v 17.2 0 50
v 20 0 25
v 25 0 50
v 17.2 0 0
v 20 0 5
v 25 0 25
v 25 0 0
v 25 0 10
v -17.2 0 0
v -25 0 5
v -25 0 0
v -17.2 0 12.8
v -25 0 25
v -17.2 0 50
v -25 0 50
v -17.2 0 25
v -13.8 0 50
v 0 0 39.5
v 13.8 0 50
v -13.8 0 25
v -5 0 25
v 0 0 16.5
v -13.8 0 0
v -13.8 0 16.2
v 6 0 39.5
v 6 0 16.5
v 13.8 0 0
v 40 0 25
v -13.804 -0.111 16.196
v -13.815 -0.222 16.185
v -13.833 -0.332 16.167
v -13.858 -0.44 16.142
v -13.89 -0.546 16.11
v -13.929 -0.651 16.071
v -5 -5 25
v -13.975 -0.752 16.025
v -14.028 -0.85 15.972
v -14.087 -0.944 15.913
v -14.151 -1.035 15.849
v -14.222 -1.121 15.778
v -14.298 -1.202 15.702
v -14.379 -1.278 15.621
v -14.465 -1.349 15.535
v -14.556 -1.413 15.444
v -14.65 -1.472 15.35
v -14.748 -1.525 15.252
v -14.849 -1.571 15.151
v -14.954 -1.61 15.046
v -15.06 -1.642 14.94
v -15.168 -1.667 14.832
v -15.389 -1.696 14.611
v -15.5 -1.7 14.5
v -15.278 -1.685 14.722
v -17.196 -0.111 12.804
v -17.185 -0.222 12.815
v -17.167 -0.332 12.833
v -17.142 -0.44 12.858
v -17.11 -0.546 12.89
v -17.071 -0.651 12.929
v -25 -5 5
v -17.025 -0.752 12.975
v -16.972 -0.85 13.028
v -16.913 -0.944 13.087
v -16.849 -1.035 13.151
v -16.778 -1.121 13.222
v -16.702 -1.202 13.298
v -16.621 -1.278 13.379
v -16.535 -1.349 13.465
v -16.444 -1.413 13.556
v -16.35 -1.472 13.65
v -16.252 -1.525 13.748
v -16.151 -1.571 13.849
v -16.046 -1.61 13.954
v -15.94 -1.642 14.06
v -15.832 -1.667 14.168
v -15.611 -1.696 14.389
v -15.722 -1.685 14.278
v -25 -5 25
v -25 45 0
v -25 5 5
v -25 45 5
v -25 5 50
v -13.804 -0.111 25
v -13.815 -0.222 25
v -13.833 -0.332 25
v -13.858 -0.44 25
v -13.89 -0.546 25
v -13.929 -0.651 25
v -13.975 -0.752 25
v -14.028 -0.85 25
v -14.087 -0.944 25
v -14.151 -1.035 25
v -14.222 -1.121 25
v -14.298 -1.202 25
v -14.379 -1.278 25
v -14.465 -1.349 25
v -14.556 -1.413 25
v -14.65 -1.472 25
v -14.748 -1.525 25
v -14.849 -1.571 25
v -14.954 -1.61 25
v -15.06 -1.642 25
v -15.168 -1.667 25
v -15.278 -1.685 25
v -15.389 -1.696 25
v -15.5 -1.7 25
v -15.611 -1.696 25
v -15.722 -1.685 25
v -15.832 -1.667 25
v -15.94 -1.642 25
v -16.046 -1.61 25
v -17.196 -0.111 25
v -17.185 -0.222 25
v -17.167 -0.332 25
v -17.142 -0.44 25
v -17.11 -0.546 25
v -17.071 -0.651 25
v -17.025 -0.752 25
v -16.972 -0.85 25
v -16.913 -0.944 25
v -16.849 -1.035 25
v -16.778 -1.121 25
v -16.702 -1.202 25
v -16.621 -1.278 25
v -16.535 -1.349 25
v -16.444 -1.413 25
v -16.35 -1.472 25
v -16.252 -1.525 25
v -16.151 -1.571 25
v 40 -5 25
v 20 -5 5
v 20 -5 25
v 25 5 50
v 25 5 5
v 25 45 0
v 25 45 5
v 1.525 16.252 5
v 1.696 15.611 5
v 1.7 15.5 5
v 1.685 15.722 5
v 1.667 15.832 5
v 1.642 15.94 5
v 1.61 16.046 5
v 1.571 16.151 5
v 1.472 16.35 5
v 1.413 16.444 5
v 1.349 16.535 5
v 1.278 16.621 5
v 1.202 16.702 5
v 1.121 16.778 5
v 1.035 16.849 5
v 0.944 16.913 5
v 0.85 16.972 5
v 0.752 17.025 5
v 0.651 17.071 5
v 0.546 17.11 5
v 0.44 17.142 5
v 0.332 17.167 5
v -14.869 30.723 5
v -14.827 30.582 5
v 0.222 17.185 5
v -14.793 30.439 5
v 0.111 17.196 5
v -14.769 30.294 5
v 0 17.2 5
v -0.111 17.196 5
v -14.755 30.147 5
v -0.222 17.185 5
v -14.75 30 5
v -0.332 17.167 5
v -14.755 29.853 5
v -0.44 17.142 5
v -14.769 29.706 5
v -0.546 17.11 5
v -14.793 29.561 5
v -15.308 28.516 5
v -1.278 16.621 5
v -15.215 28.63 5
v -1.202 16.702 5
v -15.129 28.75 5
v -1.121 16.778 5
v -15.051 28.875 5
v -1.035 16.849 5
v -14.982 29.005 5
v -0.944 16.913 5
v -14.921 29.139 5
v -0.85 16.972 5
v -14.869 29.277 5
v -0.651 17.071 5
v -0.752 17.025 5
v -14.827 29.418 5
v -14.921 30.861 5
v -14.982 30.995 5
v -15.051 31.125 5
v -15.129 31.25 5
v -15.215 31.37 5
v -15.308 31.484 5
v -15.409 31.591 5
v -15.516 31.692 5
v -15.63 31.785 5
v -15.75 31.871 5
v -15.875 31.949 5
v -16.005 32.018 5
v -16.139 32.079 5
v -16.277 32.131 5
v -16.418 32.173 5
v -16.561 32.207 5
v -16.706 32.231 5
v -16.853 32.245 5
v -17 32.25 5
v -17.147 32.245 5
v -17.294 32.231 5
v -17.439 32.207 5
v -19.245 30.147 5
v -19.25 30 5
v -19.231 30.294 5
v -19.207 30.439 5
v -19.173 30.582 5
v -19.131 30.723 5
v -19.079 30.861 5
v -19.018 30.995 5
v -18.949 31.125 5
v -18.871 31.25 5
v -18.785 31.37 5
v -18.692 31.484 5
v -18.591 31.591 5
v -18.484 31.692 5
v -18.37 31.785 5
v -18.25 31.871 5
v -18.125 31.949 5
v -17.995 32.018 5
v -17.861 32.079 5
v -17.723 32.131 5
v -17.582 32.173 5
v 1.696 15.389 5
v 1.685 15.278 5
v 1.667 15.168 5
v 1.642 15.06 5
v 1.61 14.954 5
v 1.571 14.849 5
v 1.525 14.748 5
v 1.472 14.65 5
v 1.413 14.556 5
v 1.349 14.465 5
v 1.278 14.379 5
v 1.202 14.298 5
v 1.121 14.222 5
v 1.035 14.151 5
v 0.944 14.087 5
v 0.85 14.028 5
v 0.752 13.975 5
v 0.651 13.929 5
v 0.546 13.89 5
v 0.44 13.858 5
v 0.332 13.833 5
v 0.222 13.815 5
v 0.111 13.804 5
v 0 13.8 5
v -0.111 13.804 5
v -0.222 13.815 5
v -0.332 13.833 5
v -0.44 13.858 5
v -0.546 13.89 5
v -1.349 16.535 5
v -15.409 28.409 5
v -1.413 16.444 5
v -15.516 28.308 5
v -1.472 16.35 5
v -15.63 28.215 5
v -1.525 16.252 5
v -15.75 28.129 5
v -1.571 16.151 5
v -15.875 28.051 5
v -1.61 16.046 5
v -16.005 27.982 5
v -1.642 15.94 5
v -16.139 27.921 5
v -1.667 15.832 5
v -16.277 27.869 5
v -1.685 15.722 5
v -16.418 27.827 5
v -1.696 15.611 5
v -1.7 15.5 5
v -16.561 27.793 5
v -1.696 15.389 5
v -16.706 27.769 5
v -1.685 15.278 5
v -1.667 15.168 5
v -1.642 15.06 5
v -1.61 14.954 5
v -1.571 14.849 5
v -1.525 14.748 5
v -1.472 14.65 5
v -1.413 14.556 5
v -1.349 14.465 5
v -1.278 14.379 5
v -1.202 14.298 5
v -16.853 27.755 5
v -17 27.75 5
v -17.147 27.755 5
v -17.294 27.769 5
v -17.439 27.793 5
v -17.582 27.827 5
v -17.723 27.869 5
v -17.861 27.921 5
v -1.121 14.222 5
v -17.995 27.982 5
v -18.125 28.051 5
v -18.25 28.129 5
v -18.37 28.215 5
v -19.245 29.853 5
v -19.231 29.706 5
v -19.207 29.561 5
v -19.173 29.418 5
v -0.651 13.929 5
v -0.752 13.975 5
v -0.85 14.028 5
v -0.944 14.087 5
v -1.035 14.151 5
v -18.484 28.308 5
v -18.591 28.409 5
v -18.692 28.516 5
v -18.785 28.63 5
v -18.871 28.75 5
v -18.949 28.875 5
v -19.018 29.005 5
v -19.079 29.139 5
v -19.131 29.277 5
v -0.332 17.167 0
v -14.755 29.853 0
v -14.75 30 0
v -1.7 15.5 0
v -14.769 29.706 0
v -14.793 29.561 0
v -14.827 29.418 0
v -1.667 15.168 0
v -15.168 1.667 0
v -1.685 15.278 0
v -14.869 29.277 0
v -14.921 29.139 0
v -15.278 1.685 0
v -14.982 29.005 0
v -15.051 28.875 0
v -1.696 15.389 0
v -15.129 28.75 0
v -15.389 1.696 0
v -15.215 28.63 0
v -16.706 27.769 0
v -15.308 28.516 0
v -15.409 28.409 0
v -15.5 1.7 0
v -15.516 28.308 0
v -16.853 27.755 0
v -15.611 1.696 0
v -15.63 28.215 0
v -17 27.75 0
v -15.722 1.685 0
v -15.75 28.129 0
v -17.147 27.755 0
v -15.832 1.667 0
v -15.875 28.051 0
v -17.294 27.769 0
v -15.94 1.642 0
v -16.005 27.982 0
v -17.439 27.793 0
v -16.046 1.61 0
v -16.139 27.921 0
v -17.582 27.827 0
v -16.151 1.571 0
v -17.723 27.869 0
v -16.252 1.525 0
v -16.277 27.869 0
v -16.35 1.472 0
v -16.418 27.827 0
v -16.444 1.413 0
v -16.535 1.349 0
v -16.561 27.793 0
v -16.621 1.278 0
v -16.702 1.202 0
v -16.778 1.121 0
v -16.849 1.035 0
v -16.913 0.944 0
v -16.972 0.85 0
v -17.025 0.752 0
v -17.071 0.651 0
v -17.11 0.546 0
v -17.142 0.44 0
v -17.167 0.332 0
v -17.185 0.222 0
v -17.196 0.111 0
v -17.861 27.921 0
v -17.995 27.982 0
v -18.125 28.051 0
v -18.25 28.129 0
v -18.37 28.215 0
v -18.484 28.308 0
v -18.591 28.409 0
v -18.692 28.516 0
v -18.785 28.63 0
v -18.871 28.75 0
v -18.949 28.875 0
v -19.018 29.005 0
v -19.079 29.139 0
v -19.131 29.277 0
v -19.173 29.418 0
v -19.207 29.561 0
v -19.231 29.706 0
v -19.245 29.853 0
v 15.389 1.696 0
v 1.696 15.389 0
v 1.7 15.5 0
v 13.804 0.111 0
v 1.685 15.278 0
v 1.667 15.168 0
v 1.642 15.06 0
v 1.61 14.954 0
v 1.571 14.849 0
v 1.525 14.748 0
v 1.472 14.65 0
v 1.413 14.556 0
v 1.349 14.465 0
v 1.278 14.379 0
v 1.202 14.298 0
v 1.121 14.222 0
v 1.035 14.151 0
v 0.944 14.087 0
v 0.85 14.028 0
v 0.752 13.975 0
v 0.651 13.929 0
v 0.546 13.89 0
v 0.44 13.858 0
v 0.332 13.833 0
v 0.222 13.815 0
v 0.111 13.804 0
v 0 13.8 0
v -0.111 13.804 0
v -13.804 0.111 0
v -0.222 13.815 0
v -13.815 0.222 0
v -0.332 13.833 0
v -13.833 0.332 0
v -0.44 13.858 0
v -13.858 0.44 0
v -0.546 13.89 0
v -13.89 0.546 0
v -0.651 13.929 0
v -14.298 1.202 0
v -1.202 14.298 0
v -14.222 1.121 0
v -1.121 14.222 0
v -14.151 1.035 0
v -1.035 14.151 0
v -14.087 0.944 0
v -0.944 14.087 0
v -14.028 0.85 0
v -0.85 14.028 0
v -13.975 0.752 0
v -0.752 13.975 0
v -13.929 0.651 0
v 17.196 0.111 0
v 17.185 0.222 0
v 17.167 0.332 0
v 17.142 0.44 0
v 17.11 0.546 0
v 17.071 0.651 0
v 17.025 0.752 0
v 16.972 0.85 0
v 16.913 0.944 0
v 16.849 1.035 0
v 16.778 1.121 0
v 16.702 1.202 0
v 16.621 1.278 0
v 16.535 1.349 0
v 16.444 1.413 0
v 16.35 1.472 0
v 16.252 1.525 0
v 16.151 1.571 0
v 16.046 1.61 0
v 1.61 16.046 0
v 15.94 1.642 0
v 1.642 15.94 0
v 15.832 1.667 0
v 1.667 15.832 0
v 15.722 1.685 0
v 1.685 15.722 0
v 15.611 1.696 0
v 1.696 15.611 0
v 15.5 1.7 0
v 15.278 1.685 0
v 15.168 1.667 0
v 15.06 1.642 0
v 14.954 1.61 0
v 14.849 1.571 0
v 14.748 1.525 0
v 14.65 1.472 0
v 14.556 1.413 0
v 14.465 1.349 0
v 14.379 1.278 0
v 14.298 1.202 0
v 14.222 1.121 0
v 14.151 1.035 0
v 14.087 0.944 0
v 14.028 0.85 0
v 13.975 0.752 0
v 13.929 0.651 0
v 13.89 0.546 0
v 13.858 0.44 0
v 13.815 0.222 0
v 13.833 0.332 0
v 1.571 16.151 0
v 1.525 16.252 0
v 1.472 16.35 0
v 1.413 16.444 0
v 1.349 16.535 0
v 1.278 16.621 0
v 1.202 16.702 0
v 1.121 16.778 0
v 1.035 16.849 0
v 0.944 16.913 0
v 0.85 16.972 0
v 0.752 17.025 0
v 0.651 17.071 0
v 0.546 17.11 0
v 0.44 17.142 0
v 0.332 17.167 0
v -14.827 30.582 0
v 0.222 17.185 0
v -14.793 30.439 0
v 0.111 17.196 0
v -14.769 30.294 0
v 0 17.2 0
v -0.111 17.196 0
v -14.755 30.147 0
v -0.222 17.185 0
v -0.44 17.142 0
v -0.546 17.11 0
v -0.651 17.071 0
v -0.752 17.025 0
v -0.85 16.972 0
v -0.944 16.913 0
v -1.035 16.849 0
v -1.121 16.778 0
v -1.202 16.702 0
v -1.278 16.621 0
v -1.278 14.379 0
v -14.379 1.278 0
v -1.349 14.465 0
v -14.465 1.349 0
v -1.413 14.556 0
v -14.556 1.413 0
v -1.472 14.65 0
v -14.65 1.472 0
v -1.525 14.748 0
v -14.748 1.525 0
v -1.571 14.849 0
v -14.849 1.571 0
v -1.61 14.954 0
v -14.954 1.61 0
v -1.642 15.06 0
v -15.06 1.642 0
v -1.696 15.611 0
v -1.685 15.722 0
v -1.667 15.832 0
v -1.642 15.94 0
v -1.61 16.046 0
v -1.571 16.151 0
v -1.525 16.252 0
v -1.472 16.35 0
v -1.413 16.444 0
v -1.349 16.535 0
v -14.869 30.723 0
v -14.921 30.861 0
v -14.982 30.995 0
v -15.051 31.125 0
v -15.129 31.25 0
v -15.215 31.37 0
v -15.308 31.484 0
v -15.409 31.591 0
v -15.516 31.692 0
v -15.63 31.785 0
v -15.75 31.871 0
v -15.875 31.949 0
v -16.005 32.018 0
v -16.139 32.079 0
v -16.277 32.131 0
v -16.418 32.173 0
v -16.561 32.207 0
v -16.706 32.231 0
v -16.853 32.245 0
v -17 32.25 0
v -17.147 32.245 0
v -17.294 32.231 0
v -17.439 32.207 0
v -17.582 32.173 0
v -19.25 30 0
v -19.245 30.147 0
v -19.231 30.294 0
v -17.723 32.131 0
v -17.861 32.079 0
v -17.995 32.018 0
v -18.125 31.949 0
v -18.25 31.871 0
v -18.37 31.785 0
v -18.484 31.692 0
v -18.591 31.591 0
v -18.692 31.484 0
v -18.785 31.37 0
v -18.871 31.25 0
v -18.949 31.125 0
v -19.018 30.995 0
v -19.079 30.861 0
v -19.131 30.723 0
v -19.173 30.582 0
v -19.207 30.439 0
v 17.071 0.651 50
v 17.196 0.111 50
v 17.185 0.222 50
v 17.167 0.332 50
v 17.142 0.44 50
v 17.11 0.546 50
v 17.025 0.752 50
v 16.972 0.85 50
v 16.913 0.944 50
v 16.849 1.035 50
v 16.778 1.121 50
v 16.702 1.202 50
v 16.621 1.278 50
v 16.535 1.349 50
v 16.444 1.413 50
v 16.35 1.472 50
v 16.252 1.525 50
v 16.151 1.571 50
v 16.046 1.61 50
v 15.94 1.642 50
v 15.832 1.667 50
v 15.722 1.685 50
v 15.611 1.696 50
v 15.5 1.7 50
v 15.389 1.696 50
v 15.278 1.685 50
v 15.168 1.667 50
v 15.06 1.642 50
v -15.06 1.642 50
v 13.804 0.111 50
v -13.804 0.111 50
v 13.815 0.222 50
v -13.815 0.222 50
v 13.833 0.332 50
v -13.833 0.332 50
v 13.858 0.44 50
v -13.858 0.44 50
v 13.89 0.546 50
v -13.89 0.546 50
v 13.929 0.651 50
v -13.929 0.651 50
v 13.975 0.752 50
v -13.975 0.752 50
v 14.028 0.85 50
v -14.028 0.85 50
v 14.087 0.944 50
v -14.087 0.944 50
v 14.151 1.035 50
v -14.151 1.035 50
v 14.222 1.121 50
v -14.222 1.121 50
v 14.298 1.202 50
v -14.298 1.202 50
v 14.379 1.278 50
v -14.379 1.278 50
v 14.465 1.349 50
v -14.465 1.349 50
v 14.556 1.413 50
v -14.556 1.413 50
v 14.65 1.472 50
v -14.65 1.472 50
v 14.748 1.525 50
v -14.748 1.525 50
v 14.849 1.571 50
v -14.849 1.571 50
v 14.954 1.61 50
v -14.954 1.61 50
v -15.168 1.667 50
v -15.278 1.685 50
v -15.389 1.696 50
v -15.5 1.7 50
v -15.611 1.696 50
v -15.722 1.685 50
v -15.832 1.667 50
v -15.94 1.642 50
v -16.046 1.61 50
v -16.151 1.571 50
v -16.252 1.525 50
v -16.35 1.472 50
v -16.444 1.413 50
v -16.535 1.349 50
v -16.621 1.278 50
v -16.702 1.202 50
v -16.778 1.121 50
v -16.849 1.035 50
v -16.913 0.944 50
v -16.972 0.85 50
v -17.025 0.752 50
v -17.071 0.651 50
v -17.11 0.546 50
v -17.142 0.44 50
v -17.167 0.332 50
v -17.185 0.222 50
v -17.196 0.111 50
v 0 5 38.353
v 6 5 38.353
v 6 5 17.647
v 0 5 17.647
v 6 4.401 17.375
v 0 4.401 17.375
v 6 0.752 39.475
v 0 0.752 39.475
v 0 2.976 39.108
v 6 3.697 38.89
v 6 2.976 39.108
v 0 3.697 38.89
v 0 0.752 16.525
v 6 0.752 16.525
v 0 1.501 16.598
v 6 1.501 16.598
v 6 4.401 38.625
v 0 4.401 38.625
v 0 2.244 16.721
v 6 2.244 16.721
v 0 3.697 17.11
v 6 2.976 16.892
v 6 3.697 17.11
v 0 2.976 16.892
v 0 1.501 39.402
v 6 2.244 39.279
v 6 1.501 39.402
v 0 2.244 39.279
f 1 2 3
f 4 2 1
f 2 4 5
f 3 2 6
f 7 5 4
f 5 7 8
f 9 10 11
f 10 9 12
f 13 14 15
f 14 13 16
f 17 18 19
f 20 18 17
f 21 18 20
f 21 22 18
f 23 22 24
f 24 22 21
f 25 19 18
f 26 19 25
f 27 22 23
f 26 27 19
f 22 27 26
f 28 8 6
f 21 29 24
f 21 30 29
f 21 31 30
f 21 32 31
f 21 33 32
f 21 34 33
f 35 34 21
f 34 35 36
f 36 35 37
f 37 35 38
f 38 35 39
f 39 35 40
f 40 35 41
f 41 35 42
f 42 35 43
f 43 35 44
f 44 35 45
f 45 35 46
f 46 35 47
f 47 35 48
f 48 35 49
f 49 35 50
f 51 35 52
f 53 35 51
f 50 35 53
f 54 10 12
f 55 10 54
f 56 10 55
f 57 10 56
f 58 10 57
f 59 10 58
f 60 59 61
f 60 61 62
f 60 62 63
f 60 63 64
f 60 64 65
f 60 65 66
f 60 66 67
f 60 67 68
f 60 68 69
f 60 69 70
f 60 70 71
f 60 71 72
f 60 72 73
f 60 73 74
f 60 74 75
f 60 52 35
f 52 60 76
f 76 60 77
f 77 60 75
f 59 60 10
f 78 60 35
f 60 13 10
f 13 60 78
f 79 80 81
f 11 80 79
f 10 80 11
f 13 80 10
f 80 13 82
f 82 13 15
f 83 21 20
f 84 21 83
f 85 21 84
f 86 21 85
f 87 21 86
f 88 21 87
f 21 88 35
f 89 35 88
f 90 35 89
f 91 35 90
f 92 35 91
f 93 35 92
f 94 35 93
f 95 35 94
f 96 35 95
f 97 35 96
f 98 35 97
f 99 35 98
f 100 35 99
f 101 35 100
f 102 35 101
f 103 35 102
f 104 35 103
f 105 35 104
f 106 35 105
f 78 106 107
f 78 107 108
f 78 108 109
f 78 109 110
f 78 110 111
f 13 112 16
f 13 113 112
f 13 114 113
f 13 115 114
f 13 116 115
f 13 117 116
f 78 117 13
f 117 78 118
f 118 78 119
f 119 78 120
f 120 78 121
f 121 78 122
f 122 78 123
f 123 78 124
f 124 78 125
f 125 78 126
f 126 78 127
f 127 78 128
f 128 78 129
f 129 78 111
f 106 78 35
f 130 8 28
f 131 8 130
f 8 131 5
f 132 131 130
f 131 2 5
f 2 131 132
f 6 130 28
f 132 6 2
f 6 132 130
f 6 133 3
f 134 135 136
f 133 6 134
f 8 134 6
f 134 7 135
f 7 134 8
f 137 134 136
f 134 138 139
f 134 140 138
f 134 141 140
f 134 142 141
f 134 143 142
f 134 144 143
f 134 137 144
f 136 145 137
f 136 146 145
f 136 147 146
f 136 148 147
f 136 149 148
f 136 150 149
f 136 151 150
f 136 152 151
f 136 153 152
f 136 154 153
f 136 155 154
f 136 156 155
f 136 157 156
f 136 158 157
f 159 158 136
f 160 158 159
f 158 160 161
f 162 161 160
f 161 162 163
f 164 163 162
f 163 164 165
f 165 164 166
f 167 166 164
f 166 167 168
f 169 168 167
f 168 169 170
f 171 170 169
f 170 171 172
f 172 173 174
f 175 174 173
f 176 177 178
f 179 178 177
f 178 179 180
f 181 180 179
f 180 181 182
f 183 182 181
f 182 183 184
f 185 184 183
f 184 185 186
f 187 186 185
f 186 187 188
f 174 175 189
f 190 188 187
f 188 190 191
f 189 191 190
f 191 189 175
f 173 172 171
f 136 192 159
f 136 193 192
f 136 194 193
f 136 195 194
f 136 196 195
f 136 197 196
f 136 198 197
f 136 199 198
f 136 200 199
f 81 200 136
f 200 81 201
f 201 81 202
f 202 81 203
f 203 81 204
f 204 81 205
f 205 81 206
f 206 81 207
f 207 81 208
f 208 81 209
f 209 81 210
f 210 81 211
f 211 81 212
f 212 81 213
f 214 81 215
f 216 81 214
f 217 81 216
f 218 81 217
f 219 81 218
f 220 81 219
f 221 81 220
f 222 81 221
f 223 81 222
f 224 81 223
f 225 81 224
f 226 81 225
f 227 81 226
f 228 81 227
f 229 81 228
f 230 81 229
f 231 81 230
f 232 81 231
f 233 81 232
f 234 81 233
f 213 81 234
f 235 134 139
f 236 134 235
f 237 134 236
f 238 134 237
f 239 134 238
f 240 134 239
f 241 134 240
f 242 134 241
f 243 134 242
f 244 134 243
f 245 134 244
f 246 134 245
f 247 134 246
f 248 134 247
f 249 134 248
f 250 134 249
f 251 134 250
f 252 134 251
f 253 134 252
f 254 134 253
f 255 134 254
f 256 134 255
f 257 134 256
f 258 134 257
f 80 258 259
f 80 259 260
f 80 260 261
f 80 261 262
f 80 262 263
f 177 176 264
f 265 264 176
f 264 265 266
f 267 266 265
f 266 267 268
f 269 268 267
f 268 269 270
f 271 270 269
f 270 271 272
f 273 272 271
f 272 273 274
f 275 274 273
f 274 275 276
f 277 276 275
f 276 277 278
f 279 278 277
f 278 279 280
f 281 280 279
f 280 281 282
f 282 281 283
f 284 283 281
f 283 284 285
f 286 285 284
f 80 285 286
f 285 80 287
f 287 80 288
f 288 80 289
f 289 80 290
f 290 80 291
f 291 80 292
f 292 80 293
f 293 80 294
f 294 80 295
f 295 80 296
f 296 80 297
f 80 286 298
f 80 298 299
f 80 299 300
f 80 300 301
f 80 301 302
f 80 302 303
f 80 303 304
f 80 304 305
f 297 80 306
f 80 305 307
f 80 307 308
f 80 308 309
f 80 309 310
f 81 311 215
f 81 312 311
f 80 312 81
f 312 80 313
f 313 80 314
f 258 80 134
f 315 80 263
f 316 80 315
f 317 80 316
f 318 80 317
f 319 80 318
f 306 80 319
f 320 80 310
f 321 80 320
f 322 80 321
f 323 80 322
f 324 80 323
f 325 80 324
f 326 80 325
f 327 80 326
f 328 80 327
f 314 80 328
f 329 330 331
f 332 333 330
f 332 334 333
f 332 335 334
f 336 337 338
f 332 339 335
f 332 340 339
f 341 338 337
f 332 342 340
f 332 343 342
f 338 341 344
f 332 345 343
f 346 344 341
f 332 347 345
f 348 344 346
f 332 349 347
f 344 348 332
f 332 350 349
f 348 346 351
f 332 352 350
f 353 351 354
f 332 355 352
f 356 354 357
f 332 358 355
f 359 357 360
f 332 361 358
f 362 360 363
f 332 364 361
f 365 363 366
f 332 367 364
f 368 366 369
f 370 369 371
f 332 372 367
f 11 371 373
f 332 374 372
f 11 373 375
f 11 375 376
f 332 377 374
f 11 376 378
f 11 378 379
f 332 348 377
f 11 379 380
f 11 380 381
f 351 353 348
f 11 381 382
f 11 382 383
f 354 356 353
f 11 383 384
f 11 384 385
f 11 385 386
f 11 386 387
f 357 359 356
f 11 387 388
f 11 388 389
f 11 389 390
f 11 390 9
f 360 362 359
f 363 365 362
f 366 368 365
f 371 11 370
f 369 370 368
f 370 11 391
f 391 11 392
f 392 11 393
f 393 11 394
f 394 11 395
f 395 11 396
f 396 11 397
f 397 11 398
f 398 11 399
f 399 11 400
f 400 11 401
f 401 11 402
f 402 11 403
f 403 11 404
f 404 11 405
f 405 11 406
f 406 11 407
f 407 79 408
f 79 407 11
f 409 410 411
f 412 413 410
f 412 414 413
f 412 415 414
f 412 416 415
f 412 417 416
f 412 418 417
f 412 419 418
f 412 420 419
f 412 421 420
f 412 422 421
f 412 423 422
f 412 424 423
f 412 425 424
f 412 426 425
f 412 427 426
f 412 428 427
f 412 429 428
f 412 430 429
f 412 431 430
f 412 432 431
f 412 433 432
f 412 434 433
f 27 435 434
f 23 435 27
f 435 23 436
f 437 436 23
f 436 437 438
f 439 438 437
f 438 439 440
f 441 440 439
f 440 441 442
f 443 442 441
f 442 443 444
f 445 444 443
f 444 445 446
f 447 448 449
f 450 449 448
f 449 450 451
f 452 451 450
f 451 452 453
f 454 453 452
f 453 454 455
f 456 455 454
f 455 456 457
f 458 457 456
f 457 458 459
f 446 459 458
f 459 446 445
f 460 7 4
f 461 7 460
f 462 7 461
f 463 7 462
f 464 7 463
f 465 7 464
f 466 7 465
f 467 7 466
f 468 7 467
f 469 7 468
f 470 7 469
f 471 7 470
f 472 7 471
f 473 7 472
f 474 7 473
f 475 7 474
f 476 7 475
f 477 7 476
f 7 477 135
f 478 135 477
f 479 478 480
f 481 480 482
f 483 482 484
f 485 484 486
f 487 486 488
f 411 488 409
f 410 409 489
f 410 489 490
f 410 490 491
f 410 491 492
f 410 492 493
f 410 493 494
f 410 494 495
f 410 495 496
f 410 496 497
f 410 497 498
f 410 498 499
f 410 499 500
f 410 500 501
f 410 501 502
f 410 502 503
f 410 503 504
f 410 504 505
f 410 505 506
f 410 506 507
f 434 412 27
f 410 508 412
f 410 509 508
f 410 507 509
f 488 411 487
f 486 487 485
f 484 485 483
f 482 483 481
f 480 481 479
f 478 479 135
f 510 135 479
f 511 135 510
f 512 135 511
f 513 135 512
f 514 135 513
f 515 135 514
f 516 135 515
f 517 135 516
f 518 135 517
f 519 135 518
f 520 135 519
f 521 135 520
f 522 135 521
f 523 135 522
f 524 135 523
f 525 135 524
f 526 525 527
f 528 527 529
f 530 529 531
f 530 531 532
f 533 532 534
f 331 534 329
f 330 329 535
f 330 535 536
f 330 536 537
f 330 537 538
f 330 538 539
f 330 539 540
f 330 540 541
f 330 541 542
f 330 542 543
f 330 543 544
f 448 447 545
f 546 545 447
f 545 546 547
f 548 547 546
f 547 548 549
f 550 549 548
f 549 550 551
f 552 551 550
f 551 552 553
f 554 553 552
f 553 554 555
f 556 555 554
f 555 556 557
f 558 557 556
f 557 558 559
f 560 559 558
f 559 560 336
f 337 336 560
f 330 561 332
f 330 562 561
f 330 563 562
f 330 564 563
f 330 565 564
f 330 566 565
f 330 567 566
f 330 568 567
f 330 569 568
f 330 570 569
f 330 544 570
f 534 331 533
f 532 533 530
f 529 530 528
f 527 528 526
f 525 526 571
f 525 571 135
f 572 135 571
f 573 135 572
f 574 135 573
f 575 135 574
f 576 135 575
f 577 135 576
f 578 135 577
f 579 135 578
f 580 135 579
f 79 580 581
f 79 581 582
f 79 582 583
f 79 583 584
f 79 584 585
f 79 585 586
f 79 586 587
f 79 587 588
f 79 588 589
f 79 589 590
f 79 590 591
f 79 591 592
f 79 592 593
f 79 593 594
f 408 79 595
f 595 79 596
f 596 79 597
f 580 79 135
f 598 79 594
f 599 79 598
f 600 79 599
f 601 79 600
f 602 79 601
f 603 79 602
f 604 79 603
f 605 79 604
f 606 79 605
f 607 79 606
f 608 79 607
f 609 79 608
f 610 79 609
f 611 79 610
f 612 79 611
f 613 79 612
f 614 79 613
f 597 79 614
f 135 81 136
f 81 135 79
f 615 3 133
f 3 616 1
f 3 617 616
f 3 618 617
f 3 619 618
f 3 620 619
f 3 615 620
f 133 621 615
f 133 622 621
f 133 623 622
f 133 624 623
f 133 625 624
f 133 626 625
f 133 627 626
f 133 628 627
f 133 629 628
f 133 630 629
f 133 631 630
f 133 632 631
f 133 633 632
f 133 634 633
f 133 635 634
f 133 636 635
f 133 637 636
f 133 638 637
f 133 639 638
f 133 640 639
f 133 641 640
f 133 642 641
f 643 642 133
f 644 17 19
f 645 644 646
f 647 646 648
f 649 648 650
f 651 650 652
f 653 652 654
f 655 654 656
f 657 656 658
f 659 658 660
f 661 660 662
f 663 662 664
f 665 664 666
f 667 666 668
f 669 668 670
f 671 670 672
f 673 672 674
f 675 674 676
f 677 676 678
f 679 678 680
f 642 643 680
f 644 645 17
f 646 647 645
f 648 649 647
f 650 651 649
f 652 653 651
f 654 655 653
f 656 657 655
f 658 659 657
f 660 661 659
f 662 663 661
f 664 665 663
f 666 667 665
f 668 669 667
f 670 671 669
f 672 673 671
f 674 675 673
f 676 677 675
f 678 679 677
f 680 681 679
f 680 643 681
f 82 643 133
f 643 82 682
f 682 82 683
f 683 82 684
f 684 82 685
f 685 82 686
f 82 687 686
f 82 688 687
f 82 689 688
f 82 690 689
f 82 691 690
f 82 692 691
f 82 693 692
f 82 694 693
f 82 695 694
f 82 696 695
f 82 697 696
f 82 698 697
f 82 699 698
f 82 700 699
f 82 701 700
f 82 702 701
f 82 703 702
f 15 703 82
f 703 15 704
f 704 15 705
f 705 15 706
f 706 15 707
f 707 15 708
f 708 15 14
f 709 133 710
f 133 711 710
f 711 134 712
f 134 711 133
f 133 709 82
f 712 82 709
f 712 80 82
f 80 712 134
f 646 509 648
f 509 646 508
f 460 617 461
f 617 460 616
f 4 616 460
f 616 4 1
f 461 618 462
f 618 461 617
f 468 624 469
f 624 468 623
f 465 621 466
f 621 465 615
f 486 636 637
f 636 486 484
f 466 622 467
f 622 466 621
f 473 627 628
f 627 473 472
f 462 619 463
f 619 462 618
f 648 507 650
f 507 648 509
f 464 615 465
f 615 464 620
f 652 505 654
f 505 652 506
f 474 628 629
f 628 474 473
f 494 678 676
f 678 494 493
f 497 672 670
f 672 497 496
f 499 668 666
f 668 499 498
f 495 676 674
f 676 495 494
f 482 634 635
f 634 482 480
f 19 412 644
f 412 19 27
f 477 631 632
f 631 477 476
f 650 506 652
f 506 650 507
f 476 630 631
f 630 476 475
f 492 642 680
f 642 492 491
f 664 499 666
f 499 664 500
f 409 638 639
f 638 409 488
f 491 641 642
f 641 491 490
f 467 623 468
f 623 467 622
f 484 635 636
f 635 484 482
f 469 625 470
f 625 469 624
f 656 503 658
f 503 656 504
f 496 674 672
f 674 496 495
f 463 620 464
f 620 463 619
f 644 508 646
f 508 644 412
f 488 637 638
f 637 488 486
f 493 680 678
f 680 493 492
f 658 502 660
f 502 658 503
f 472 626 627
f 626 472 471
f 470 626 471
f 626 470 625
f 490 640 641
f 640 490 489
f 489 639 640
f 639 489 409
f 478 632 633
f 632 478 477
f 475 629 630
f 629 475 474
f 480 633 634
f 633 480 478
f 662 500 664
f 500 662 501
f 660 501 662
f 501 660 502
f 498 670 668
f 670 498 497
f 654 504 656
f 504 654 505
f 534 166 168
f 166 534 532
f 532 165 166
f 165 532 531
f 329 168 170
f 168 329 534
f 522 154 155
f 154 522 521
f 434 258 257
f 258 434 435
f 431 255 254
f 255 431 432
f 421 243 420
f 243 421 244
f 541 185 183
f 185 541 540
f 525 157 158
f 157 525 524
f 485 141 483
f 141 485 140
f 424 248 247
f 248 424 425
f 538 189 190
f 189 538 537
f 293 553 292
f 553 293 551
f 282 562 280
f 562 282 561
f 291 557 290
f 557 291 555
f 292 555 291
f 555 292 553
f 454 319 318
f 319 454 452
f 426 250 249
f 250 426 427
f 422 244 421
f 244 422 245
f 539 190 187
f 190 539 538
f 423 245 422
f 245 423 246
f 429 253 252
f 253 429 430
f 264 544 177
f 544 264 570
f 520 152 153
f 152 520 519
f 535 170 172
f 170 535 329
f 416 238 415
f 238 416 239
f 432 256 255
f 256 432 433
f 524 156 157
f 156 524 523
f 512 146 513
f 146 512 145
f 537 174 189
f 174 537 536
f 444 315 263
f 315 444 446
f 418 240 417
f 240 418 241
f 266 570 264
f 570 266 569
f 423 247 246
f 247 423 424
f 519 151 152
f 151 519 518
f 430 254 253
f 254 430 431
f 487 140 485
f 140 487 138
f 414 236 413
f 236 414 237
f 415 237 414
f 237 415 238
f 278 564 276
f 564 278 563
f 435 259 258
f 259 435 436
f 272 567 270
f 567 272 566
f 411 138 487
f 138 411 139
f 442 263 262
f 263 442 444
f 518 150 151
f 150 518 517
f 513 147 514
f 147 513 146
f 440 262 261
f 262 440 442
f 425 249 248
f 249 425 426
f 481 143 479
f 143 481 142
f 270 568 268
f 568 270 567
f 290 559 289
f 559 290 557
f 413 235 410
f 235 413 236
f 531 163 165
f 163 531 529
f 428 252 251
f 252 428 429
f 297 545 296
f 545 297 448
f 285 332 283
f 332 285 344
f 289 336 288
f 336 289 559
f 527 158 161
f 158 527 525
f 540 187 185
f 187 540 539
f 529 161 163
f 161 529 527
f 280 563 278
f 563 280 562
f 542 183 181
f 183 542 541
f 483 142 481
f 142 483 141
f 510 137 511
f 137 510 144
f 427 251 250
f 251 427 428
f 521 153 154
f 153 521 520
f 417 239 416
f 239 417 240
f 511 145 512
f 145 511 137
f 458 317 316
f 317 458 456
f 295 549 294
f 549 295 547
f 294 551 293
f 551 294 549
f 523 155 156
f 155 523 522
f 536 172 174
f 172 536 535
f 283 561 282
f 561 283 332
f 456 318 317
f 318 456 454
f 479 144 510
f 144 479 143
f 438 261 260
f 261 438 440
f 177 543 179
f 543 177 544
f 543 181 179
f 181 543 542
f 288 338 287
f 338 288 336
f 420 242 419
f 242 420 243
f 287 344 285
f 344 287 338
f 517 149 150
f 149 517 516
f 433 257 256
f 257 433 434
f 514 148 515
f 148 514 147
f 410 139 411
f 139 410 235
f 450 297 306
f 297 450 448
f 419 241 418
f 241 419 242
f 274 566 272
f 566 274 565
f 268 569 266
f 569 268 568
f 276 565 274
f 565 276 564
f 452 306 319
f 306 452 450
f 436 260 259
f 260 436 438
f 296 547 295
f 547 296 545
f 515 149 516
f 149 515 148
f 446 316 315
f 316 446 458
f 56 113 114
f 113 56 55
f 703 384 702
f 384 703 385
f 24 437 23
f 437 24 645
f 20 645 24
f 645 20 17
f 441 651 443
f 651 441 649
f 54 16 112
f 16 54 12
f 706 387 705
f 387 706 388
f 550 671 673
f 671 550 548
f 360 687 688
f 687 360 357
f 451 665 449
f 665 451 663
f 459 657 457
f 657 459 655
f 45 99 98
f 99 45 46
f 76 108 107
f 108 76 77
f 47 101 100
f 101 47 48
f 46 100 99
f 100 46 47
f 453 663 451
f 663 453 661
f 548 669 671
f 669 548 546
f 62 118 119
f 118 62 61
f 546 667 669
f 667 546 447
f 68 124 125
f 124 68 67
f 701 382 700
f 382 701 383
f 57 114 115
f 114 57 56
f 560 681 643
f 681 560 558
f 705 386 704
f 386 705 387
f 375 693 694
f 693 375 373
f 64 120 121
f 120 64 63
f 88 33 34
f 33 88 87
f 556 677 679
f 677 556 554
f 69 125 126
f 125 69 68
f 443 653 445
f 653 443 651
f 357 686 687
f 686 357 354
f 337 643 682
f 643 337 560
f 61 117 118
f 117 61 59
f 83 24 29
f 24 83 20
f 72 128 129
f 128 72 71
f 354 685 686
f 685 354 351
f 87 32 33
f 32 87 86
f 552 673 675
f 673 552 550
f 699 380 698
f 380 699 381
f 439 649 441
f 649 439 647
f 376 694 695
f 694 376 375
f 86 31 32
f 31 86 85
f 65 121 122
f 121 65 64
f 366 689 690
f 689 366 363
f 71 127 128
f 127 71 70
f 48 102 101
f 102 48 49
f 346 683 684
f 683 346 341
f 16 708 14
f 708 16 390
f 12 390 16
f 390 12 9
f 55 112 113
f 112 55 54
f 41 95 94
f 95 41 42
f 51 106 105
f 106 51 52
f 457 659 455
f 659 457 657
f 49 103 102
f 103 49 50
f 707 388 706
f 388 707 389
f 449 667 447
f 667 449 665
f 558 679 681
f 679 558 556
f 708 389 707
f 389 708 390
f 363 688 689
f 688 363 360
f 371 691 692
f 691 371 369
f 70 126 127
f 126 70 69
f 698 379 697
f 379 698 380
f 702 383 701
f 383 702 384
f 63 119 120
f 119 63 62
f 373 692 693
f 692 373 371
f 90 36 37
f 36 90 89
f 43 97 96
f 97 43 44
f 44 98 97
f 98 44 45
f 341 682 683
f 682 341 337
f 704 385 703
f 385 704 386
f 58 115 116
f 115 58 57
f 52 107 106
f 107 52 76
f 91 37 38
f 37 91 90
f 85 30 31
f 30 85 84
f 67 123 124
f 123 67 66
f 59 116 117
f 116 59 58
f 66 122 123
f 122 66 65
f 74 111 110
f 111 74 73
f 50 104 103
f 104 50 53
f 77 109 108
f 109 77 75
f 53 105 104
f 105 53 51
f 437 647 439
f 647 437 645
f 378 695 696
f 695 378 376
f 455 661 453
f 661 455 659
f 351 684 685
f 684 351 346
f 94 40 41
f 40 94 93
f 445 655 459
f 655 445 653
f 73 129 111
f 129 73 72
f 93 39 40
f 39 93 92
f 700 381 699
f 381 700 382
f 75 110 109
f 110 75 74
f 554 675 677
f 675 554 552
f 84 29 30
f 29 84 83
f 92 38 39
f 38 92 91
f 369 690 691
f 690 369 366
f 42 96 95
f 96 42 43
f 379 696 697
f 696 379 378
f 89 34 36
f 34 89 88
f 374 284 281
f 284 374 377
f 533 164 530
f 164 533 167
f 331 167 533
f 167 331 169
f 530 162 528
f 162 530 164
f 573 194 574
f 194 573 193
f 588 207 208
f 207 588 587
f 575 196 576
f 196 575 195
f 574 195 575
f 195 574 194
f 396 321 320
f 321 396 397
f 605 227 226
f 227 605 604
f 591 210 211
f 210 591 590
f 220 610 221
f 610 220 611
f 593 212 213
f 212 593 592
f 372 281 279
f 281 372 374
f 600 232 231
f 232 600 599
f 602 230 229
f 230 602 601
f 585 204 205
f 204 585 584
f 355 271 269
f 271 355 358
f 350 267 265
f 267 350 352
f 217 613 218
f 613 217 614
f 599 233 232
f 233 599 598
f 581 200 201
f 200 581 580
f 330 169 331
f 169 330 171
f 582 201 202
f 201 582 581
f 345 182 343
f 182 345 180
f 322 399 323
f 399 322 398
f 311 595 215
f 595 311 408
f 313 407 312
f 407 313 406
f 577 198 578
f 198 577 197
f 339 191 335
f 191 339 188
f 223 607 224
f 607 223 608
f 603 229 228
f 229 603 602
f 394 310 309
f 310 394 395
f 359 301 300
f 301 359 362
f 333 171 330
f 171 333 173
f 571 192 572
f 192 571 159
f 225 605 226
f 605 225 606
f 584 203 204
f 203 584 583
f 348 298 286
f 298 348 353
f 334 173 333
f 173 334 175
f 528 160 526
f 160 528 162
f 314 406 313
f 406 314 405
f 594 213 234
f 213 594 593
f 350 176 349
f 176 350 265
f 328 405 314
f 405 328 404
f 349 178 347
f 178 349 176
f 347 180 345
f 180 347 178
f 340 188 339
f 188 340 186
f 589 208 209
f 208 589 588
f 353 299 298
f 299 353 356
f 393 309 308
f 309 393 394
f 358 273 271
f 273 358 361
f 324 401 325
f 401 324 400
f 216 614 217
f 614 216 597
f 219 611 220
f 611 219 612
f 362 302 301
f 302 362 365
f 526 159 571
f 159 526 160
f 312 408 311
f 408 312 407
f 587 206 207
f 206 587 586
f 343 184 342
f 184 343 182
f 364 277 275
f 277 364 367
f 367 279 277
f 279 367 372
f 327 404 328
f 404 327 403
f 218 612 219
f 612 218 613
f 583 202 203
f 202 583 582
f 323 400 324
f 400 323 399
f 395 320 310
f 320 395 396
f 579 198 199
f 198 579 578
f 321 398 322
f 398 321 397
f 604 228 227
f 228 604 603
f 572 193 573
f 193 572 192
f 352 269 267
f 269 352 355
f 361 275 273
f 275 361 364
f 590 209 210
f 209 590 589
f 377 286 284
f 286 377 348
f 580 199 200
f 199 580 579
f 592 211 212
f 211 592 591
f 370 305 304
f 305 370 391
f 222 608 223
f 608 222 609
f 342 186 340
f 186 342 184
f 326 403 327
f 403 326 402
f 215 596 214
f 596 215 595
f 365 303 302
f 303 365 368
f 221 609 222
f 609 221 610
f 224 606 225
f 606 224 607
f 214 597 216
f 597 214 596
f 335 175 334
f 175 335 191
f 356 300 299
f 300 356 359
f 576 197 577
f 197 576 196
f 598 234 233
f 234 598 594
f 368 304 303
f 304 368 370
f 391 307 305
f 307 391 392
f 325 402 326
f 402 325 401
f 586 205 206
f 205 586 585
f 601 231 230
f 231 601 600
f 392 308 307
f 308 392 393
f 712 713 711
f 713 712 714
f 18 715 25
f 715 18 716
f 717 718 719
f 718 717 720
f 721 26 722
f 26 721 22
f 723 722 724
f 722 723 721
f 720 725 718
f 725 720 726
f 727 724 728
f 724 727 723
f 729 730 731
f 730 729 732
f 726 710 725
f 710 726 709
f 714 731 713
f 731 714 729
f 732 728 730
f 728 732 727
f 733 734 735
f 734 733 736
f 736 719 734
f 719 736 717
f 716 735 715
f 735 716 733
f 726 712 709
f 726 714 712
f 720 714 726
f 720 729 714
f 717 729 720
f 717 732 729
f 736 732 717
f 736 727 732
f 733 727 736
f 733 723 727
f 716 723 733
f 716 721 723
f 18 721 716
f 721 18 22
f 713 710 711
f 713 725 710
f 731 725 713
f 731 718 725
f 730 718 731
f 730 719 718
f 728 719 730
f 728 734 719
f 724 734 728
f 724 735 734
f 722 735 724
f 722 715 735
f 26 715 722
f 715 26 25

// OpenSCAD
// L-shaped mounting bracket for NEMA 17 stepper motor
// Print orientation: base plate flat on bed, motor plate building upward

// ---------- Parameters ----------
base_x      = 25;     // base plate half-width (X)
base_y      = 45;     // base plate length (Y)
base_z      = 5;      // base plate thickness (Z)

hole_m4_x   = -17;    // M4 hole X offset
hole_m4_y   = 30;     // M4 hole Y position
hole_m4_d   = 4.5;    // M4 hole diameter

motor_x     = 25;     // motor plate half-width (X)
motor_y     = 5;      // motor plate thickness (Y)
motor_z     = 50;     // motor plate height (Z)

boss_d      = 23;     // boss hole diameter
boss_x      = 0;      // boss hole centre X
boss_z      = 28;     // boss hole centre Z

screw_d     = 3.4;    // M3 screw hole diameter
screw_pat   = 31;     // square pattern size for screws

gusset_t    = 5;      // gusset thickness (X)
gusset_l    = 20;     // gusset leg length (Y and Z)

eps         = 0.5;    // cutter overshoot past faces
$fn         = 96;     // curve resolution

// ---------- Model ----------
difference() {
    union() {
        // Base plate
        translate([-base_x, 0, 0])
            cube([2*base_x, base_y, base_z]);

        // Motor plate
        translate([-motor_x, 0, 0])
            cube([2*motor_x, motor_y, motor_z]);

        // Gussets (right triangle in YZ, flush with outer edges)
        for (sx = [-1, 1])
            translate([sx > 0 ? 20 : -25, 0, 0])
                rotate([90, 0, 0])
                    linear_extrude(height = gusset_t)
                        polygon([
                            [0, 5],
                            [0, 5 + gusset_l],
                            [gusset_l, 5 + gusset_l]
                        ]);
    }

    // Base plate M4 hole
    translate([hole_m4_x, hole_m4_y, -eps])
        cylinder(d = hole_m4_d, h = base_z + 2*eps);

    // Boss hole (along Y)
    translate([boss_x, 0, boss_z])
        rotate([0, 90, 0])
            cylinder(d = boss_d, h = motor_y + 2*eps);

    // M3 screw holes on square pattern
    for (a = [0, 90, 180, 270])
        rotate([0, 0, a])
            translate([screw_pat / 2, 0, -eps])
                cylinder(d = screw_d, h = motor_z + 2*eps);
}
